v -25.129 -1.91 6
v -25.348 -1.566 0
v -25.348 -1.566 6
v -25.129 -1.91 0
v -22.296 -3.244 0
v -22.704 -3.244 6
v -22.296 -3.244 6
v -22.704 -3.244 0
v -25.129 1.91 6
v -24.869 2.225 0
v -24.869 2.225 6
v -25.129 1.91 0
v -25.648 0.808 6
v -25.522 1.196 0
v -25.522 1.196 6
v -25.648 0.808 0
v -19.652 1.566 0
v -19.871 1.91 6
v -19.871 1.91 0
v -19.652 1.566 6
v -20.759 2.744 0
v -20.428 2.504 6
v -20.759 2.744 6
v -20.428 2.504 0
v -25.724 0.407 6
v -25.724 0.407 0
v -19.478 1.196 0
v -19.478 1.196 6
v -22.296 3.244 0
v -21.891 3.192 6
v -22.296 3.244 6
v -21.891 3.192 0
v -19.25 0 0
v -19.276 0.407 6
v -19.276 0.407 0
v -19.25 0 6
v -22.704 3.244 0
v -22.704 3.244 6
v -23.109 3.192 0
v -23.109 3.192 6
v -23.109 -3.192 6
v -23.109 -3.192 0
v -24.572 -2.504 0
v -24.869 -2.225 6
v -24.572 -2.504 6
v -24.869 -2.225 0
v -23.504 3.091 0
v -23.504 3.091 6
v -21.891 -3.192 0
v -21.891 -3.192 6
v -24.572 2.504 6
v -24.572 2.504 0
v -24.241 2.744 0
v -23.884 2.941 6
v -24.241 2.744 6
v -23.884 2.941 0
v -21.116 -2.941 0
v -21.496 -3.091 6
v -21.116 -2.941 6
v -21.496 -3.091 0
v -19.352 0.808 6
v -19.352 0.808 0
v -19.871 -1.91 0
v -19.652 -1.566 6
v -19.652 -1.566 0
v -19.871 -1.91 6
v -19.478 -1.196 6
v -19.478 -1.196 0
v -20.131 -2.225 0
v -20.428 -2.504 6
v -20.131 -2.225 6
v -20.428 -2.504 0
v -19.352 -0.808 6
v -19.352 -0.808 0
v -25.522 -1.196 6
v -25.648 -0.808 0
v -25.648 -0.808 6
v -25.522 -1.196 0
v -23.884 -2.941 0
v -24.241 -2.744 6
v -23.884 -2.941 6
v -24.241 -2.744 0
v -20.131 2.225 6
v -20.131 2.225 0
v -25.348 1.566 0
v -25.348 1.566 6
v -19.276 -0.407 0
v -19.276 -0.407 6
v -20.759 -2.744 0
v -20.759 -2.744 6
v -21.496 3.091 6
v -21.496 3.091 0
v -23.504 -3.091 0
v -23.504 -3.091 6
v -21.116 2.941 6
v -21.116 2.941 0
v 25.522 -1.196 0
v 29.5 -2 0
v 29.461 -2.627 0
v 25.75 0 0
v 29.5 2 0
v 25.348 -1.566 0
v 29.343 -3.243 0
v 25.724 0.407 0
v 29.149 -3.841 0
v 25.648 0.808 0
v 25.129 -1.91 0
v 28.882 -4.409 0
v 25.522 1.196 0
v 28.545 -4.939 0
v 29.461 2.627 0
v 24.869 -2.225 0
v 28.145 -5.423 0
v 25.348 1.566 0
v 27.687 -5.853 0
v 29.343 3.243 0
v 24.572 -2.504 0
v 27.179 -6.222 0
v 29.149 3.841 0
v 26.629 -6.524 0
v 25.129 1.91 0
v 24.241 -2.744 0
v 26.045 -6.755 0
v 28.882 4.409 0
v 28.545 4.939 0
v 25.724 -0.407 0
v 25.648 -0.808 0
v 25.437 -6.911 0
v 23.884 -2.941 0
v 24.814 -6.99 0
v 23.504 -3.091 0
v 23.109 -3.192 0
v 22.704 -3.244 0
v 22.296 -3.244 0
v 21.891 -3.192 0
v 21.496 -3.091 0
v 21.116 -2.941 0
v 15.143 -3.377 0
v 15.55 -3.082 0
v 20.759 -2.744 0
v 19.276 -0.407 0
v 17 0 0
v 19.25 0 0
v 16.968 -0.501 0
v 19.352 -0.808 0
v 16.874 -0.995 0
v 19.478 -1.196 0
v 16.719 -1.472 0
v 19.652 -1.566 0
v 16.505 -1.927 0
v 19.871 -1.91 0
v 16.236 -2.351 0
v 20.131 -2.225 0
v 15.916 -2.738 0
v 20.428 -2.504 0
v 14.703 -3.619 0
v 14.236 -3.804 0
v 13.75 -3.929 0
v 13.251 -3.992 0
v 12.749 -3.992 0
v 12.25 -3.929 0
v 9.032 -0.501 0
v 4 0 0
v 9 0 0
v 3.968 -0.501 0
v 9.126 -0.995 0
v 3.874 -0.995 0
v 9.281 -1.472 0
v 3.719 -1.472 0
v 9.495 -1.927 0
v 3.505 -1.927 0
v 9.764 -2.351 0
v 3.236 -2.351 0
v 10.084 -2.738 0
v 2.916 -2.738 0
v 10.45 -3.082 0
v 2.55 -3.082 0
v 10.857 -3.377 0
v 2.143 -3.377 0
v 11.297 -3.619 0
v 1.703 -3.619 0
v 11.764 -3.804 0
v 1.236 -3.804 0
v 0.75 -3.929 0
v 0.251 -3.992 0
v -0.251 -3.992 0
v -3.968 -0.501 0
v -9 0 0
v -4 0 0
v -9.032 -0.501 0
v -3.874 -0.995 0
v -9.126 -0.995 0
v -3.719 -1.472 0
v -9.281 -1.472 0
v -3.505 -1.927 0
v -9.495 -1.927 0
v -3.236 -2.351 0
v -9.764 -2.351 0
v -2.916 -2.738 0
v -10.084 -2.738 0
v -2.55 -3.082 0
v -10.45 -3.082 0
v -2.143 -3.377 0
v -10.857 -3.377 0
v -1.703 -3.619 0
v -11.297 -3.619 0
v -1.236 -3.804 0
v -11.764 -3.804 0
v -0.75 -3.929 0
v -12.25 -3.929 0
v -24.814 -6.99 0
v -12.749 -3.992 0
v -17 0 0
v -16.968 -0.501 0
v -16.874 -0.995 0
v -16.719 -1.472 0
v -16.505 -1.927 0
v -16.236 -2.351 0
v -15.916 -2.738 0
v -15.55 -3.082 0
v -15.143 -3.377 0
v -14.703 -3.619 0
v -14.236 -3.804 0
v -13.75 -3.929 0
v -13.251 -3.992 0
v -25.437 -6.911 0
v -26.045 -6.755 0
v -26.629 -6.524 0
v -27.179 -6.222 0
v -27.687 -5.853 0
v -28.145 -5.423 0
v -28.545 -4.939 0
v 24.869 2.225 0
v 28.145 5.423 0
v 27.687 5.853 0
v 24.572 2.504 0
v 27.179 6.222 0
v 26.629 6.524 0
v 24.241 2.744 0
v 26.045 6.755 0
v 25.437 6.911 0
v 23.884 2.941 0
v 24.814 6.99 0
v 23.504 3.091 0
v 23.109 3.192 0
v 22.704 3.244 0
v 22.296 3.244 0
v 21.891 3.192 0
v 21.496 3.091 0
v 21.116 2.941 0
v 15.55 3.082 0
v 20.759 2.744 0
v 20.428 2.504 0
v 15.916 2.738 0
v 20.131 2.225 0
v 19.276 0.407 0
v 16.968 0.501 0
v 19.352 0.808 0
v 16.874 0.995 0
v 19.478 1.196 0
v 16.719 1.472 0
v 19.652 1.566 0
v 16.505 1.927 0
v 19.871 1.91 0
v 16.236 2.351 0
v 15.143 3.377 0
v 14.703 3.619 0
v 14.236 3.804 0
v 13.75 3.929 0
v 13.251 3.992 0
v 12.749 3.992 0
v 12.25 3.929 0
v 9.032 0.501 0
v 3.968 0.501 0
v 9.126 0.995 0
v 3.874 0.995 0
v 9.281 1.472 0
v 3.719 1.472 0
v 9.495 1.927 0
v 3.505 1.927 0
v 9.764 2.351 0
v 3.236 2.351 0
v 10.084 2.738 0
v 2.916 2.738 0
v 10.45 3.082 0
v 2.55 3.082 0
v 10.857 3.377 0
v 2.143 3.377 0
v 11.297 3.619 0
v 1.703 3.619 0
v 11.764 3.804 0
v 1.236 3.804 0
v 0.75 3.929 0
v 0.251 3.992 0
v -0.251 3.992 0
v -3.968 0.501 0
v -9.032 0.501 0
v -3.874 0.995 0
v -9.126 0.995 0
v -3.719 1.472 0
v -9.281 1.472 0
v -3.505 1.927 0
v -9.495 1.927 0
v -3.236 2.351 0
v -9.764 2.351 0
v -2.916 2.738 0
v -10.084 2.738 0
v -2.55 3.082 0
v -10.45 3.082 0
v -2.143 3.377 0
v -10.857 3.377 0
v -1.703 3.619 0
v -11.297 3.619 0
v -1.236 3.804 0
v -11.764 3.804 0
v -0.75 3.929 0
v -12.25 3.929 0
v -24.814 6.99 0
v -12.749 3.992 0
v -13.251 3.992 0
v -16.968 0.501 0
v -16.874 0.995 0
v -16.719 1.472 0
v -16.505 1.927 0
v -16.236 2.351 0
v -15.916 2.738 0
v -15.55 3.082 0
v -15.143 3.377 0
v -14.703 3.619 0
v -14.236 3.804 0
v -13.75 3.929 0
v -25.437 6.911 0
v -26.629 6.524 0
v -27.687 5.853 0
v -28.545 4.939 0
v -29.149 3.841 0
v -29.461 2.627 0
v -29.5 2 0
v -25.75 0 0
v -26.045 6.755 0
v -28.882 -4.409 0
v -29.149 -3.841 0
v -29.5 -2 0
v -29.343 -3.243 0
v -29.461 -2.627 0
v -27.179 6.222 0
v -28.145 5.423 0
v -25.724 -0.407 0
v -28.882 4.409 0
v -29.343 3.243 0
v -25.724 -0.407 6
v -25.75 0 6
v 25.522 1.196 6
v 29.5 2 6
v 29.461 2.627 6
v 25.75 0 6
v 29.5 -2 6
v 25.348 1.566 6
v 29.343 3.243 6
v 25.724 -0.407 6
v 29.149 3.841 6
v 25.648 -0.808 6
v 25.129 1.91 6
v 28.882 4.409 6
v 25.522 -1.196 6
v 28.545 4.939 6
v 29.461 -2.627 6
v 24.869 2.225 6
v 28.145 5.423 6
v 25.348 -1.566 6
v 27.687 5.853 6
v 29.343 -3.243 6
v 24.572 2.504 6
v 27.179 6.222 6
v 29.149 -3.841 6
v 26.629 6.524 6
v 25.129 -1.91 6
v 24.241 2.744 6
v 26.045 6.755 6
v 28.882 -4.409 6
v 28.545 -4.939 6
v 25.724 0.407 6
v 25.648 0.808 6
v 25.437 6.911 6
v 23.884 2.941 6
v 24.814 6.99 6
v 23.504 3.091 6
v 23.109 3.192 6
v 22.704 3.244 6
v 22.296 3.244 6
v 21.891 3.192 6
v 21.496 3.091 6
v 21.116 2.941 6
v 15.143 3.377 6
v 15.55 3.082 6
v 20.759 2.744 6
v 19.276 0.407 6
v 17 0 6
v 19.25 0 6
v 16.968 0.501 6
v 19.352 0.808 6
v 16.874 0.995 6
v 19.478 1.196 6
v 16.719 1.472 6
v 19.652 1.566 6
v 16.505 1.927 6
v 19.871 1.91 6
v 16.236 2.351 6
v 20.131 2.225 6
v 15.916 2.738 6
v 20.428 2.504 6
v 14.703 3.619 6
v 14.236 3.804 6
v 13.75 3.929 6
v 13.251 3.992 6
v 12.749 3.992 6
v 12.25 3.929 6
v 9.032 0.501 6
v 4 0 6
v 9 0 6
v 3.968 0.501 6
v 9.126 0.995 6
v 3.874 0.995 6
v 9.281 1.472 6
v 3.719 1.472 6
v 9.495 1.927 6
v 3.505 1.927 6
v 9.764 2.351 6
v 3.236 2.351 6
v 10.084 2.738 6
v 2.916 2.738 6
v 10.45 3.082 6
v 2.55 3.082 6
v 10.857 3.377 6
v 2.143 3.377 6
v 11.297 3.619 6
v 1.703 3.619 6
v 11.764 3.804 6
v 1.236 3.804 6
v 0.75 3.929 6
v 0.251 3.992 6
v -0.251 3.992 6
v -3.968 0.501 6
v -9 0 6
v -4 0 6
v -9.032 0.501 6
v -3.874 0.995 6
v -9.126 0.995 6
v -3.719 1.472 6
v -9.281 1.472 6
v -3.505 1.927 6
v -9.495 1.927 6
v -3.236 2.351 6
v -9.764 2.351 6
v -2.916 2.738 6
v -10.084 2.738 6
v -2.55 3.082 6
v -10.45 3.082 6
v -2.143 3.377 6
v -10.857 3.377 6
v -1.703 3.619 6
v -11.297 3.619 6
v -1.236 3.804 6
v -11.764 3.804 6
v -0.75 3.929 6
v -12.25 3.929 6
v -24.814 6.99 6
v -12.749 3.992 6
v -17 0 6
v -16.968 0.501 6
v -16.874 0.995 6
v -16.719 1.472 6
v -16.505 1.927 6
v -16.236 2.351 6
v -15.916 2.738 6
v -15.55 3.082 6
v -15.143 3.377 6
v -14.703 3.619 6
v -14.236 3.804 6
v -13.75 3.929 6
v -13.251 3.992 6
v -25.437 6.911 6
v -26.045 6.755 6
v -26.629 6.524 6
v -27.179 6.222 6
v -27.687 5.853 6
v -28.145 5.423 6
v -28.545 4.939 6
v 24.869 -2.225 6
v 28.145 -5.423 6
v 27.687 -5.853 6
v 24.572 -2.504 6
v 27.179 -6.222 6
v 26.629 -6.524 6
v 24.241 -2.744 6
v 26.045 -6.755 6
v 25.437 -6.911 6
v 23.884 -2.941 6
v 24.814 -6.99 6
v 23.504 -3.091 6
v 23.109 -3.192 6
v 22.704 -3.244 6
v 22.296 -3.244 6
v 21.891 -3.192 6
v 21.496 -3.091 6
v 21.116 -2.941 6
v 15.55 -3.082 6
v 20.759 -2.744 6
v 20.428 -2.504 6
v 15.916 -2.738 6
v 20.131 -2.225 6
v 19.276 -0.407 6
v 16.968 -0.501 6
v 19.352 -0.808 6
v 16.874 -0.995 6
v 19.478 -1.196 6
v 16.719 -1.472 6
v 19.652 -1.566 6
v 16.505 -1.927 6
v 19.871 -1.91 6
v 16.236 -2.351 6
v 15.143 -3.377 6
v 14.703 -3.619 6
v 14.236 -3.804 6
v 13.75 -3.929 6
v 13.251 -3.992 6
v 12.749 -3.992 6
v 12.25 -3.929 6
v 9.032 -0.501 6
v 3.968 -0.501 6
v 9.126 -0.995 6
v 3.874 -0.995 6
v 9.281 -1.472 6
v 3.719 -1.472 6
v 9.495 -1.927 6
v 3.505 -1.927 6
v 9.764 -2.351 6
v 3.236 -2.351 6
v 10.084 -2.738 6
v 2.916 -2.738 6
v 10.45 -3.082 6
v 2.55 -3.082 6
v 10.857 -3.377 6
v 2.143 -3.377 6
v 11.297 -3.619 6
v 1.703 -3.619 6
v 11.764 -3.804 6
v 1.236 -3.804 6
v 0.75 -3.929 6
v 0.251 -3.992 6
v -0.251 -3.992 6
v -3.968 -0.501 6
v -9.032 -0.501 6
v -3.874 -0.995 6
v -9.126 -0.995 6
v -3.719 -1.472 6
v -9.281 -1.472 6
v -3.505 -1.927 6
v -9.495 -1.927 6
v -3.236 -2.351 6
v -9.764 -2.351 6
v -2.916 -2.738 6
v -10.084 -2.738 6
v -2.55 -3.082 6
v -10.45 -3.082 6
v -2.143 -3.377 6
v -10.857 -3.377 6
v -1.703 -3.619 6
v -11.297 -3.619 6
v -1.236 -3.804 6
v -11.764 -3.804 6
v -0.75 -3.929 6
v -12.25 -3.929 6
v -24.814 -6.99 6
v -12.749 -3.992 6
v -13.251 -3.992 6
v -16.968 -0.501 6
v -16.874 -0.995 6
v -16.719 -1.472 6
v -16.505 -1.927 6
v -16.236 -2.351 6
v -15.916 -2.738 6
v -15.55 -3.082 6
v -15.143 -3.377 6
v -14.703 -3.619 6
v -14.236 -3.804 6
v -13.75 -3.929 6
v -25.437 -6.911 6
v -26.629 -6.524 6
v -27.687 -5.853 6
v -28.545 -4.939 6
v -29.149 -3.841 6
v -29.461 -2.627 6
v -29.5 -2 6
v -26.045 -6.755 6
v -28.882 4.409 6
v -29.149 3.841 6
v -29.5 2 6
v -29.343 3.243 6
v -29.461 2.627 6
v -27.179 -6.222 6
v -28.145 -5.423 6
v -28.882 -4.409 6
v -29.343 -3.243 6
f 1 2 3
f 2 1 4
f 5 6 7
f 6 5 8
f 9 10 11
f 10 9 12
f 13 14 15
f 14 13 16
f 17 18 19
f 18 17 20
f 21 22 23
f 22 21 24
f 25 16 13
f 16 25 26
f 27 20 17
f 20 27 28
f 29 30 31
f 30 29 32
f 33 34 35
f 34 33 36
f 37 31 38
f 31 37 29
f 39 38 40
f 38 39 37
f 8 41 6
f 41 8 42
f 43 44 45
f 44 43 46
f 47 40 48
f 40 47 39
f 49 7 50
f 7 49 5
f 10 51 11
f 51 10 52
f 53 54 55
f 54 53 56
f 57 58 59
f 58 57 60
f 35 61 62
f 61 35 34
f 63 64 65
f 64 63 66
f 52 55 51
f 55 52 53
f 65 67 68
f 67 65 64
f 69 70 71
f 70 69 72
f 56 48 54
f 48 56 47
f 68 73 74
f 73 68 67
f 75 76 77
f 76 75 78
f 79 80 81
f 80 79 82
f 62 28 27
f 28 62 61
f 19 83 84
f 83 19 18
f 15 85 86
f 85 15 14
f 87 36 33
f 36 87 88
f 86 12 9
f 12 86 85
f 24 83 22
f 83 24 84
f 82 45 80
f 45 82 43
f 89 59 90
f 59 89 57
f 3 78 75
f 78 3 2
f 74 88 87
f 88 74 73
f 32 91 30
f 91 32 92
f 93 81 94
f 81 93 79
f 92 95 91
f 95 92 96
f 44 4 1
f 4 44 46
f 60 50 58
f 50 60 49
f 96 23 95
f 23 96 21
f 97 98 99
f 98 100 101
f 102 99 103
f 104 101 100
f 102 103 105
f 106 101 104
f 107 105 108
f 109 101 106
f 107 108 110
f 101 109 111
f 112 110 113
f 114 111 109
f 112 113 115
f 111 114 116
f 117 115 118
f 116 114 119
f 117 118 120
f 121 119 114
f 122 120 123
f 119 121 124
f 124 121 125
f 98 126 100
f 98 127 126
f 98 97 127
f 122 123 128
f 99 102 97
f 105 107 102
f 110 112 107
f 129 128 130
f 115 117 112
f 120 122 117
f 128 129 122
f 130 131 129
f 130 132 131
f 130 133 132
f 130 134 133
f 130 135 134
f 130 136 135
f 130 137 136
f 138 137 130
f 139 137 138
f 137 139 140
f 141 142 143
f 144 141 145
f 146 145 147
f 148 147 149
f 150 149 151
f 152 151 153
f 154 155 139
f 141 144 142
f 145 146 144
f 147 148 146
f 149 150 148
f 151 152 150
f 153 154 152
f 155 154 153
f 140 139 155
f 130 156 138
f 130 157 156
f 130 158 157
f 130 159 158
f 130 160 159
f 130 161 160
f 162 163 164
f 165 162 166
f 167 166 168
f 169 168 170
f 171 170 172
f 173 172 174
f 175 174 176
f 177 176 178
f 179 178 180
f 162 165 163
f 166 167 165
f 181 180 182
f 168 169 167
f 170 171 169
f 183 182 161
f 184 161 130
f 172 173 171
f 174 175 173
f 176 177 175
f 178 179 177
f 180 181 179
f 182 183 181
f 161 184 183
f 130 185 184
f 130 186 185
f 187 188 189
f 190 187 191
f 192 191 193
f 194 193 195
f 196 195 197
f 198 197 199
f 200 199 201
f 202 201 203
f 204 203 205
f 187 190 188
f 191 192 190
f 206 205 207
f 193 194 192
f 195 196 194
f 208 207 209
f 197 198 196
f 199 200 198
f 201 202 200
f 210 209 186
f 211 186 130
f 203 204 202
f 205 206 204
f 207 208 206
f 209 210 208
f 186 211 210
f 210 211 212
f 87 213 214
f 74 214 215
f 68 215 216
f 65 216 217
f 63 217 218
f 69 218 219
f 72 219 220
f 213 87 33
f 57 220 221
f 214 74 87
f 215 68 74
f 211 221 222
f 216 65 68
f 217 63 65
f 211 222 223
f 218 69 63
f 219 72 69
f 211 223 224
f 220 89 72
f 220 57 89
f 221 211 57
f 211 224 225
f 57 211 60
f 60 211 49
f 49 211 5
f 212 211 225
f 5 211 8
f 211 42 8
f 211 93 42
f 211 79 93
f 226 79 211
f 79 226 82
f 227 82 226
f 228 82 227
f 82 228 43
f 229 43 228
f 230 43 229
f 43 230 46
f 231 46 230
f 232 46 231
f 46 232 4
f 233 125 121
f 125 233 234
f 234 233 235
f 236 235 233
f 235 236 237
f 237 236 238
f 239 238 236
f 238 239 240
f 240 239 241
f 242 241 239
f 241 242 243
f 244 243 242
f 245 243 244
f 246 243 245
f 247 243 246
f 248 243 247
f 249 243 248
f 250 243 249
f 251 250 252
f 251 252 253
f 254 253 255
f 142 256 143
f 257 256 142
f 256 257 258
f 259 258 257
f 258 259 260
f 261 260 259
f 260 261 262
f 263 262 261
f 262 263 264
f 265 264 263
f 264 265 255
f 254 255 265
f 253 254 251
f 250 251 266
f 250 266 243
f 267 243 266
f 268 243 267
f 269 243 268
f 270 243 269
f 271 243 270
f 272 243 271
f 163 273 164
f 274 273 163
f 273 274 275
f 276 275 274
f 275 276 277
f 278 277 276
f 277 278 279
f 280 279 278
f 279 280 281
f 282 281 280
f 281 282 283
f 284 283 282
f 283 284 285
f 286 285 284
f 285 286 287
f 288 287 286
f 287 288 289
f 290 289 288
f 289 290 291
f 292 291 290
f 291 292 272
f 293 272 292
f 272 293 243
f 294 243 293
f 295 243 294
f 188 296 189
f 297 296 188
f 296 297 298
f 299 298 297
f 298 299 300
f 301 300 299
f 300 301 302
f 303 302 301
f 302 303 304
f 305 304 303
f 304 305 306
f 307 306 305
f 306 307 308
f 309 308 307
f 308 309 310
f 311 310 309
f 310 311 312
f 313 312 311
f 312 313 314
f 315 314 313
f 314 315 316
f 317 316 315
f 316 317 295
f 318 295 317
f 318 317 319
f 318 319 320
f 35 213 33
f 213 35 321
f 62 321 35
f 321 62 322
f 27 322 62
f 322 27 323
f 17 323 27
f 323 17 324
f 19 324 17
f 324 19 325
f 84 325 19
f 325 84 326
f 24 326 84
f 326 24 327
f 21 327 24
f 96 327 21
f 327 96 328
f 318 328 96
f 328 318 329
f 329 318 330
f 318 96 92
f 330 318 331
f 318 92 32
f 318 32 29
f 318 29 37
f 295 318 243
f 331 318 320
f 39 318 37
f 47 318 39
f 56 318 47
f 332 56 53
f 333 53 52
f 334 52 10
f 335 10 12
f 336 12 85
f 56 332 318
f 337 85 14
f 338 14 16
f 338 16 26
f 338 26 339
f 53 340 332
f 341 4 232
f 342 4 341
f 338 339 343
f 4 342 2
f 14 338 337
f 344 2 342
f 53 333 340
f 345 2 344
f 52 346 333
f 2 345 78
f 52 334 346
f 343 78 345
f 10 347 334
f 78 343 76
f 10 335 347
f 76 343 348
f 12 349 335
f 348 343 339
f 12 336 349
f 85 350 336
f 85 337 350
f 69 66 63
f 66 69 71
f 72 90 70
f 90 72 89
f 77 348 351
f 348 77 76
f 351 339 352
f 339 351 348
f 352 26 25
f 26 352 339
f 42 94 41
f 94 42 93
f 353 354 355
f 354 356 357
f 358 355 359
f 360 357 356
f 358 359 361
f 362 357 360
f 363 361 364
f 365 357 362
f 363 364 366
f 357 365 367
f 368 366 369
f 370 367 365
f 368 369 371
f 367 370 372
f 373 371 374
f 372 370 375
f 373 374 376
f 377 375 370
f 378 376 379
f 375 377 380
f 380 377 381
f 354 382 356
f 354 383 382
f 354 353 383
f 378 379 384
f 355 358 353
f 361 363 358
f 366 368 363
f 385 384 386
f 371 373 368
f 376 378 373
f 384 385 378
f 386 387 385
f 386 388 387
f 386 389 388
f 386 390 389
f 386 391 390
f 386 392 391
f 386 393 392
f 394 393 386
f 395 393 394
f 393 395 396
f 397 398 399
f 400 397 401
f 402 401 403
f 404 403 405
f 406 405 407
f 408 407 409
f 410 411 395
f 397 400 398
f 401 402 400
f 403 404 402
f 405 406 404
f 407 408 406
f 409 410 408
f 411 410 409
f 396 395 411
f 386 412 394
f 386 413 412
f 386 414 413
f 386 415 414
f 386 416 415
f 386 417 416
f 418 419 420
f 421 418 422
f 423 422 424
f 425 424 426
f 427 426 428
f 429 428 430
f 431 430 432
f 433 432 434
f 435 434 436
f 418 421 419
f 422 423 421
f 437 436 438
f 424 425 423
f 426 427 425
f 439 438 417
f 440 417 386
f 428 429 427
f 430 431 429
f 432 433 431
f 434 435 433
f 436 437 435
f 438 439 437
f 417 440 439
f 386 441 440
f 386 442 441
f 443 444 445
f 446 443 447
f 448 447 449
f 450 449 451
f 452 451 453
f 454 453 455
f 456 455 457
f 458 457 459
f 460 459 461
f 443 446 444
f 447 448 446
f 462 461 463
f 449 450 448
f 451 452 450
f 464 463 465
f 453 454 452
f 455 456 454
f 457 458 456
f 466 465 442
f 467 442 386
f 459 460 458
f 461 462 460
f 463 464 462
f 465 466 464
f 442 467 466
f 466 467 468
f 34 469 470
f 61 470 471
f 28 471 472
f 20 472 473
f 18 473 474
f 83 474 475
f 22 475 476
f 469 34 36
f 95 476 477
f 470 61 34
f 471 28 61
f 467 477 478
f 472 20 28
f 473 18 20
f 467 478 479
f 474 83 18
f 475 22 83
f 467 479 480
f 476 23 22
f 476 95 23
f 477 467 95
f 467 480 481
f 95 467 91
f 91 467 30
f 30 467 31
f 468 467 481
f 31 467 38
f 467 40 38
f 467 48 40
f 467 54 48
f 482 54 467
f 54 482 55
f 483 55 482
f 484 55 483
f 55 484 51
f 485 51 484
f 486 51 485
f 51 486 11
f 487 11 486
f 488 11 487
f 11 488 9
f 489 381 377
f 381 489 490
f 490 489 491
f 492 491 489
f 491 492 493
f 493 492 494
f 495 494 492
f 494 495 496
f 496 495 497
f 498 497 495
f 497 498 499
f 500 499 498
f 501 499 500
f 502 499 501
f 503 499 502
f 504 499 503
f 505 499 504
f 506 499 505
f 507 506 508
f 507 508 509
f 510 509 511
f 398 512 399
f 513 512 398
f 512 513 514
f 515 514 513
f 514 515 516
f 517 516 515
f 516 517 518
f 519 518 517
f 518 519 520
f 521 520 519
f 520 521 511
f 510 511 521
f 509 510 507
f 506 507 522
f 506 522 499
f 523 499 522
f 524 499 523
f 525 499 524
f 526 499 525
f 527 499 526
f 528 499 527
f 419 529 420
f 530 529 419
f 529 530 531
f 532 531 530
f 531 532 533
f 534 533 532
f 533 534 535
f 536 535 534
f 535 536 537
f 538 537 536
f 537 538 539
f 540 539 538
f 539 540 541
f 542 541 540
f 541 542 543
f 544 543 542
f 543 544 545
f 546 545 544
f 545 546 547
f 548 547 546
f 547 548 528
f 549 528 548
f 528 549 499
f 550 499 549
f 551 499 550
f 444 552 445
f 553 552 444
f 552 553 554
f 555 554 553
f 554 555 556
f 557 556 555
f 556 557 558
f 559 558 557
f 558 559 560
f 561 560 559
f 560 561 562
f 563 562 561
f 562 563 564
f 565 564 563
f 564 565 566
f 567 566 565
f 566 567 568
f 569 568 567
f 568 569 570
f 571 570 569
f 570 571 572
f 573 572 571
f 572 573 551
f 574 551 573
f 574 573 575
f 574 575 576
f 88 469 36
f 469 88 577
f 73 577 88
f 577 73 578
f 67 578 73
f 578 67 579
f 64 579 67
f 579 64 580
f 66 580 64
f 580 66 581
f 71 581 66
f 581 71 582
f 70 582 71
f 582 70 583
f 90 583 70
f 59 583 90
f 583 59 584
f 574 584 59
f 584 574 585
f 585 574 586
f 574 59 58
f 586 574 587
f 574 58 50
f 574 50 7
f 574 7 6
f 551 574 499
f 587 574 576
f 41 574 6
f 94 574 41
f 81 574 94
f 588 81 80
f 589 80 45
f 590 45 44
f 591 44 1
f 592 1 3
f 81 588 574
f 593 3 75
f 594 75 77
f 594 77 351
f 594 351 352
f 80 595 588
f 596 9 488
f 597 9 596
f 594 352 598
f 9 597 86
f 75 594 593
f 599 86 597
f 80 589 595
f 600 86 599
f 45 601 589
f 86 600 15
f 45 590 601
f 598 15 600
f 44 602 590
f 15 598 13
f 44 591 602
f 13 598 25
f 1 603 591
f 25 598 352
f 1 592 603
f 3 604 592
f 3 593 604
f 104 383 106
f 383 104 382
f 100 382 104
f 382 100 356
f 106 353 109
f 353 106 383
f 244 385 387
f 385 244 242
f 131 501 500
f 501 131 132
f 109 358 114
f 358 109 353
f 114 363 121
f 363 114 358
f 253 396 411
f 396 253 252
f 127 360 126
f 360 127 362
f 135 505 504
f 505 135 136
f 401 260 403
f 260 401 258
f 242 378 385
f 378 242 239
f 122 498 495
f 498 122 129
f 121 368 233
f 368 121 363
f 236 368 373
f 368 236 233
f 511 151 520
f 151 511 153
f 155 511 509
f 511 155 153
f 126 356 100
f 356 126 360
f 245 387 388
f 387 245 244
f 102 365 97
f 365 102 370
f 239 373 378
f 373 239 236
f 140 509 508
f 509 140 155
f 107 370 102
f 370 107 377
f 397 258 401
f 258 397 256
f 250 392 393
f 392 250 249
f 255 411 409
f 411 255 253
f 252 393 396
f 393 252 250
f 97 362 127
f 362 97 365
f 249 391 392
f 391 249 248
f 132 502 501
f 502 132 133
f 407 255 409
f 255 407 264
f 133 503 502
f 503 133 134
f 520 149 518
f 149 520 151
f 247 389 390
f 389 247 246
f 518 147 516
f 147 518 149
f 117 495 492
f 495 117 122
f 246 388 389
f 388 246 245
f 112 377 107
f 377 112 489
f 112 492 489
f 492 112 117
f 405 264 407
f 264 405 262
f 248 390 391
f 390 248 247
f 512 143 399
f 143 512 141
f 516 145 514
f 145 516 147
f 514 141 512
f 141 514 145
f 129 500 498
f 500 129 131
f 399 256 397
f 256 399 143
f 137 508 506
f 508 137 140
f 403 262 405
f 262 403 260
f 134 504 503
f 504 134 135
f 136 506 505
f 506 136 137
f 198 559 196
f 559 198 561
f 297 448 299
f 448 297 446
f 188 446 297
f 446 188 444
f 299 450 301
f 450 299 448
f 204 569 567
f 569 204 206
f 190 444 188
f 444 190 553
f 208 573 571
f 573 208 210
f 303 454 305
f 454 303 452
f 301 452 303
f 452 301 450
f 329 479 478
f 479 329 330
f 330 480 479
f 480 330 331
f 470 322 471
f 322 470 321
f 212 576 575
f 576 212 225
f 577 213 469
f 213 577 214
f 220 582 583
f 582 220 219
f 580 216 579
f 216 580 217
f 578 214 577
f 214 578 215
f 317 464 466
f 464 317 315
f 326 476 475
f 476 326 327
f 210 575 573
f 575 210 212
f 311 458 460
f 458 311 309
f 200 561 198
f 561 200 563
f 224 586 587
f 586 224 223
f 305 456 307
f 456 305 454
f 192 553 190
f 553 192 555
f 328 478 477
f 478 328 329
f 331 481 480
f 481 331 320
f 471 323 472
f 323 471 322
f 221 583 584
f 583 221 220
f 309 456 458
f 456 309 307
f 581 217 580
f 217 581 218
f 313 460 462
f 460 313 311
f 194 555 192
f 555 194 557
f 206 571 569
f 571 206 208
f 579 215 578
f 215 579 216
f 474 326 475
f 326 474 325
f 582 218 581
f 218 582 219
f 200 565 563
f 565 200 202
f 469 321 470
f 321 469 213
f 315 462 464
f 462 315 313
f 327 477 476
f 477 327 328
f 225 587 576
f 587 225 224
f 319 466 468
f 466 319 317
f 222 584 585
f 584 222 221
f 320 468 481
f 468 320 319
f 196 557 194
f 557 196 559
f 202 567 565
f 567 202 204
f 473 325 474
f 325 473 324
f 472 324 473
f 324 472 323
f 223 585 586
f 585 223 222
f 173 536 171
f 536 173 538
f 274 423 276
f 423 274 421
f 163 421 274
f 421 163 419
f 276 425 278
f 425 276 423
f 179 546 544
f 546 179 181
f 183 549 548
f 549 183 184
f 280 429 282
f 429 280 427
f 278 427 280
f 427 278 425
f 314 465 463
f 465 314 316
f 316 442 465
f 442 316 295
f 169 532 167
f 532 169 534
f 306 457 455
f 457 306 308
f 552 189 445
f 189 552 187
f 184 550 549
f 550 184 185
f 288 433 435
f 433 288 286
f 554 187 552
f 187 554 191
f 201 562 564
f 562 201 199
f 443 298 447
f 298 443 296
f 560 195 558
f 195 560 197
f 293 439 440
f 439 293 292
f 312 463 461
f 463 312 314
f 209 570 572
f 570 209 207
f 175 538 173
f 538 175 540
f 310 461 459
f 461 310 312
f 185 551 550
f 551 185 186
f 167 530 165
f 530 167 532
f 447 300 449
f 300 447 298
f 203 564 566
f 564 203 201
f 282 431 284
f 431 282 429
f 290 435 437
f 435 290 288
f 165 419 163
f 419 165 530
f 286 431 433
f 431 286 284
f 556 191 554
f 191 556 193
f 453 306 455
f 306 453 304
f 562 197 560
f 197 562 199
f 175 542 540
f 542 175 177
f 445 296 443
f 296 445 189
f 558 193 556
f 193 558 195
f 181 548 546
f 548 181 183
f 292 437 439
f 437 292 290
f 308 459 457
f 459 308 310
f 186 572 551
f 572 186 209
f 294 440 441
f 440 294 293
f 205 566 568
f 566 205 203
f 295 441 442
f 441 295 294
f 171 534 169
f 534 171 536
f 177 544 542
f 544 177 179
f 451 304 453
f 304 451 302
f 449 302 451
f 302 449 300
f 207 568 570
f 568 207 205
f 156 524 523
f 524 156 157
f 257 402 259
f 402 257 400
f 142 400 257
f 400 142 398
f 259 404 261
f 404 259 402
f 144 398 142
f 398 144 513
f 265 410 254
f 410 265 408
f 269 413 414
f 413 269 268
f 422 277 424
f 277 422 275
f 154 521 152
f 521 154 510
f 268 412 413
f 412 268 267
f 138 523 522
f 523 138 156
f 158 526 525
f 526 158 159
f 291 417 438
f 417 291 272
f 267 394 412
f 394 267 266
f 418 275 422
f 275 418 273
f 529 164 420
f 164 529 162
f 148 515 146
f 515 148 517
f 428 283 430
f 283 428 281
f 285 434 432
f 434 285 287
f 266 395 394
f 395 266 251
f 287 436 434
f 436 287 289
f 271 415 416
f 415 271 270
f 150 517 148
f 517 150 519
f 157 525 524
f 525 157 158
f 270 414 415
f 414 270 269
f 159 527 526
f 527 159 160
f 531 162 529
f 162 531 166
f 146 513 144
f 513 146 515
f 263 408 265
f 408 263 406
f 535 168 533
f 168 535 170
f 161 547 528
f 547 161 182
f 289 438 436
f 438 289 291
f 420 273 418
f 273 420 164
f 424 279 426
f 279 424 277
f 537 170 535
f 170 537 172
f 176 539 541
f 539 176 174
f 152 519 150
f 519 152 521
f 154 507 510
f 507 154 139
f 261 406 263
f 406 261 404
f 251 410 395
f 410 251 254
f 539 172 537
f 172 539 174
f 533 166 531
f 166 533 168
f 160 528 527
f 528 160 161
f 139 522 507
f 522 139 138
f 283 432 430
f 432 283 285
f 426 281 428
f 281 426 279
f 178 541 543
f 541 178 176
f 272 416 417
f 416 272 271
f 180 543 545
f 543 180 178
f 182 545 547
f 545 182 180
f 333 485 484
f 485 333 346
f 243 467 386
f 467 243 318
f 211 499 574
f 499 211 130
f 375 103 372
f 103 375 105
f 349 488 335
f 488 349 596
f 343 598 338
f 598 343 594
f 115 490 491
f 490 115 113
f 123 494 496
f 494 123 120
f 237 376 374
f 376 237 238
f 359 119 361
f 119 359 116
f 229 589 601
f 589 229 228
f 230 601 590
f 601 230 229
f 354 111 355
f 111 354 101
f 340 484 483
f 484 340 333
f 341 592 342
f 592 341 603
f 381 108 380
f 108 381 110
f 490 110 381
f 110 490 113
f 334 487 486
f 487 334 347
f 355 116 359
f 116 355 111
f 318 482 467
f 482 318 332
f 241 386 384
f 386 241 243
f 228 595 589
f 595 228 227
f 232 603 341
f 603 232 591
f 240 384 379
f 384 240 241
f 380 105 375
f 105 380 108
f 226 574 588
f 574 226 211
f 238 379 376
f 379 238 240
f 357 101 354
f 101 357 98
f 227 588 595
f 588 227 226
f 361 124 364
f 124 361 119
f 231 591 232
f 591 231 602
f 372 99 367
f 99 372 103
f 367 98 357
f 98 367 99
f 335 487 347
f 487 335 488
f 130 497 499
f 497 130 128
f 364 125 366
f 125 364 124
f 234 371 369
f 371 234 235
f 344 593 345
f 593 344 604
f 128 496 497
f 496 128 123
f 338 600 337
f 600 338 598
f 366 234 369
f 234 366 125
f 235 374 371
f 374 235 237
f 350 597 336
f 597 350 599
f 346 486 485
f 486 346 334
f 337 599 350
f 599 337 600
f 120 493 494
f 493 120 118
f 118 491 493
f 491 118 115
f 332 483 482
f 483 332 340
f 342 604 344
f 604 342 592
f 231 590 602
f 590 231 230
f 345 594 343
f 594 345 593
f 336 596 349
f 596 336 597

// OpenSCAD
$fn = 50;

difference() {
	union() {
		hull() {
			translate(v = [-24.5, 2.0, 0]) {
				cylinder(h = 6, r = 5);
			}
			translate(v = [24.5, 2.0, 0]) {
				cylinder(h = 6, r = 5);
			}
			translate(v = [-24.5, -2.0, 0]) {
				cylinder(h = 6, r = 5);
			}
			translate(v = [24.5, -2.0, 0]) {
				cylinder(h = 6, r = 5);
			}
		}
	}
	union() {
		translate(v = [-22.5, 0.0, 0]) {
			cylinder(h = 6, r = 3.25);
		}
		translate(v = [22.5, 0.0, 0]) {
			cylinder(h = 6, r = 3.25);
		}
		translate(v = [-13.0, 0, 0.0]) {
			cylinder(h = 6, r = 4.0);
		}
		cylinder(h = 6, r = 4.0);
		translate(v = [13.0, 0, 0.0]) {
			cylinder(h = 6, r = 4.0);
		}
	}
}
